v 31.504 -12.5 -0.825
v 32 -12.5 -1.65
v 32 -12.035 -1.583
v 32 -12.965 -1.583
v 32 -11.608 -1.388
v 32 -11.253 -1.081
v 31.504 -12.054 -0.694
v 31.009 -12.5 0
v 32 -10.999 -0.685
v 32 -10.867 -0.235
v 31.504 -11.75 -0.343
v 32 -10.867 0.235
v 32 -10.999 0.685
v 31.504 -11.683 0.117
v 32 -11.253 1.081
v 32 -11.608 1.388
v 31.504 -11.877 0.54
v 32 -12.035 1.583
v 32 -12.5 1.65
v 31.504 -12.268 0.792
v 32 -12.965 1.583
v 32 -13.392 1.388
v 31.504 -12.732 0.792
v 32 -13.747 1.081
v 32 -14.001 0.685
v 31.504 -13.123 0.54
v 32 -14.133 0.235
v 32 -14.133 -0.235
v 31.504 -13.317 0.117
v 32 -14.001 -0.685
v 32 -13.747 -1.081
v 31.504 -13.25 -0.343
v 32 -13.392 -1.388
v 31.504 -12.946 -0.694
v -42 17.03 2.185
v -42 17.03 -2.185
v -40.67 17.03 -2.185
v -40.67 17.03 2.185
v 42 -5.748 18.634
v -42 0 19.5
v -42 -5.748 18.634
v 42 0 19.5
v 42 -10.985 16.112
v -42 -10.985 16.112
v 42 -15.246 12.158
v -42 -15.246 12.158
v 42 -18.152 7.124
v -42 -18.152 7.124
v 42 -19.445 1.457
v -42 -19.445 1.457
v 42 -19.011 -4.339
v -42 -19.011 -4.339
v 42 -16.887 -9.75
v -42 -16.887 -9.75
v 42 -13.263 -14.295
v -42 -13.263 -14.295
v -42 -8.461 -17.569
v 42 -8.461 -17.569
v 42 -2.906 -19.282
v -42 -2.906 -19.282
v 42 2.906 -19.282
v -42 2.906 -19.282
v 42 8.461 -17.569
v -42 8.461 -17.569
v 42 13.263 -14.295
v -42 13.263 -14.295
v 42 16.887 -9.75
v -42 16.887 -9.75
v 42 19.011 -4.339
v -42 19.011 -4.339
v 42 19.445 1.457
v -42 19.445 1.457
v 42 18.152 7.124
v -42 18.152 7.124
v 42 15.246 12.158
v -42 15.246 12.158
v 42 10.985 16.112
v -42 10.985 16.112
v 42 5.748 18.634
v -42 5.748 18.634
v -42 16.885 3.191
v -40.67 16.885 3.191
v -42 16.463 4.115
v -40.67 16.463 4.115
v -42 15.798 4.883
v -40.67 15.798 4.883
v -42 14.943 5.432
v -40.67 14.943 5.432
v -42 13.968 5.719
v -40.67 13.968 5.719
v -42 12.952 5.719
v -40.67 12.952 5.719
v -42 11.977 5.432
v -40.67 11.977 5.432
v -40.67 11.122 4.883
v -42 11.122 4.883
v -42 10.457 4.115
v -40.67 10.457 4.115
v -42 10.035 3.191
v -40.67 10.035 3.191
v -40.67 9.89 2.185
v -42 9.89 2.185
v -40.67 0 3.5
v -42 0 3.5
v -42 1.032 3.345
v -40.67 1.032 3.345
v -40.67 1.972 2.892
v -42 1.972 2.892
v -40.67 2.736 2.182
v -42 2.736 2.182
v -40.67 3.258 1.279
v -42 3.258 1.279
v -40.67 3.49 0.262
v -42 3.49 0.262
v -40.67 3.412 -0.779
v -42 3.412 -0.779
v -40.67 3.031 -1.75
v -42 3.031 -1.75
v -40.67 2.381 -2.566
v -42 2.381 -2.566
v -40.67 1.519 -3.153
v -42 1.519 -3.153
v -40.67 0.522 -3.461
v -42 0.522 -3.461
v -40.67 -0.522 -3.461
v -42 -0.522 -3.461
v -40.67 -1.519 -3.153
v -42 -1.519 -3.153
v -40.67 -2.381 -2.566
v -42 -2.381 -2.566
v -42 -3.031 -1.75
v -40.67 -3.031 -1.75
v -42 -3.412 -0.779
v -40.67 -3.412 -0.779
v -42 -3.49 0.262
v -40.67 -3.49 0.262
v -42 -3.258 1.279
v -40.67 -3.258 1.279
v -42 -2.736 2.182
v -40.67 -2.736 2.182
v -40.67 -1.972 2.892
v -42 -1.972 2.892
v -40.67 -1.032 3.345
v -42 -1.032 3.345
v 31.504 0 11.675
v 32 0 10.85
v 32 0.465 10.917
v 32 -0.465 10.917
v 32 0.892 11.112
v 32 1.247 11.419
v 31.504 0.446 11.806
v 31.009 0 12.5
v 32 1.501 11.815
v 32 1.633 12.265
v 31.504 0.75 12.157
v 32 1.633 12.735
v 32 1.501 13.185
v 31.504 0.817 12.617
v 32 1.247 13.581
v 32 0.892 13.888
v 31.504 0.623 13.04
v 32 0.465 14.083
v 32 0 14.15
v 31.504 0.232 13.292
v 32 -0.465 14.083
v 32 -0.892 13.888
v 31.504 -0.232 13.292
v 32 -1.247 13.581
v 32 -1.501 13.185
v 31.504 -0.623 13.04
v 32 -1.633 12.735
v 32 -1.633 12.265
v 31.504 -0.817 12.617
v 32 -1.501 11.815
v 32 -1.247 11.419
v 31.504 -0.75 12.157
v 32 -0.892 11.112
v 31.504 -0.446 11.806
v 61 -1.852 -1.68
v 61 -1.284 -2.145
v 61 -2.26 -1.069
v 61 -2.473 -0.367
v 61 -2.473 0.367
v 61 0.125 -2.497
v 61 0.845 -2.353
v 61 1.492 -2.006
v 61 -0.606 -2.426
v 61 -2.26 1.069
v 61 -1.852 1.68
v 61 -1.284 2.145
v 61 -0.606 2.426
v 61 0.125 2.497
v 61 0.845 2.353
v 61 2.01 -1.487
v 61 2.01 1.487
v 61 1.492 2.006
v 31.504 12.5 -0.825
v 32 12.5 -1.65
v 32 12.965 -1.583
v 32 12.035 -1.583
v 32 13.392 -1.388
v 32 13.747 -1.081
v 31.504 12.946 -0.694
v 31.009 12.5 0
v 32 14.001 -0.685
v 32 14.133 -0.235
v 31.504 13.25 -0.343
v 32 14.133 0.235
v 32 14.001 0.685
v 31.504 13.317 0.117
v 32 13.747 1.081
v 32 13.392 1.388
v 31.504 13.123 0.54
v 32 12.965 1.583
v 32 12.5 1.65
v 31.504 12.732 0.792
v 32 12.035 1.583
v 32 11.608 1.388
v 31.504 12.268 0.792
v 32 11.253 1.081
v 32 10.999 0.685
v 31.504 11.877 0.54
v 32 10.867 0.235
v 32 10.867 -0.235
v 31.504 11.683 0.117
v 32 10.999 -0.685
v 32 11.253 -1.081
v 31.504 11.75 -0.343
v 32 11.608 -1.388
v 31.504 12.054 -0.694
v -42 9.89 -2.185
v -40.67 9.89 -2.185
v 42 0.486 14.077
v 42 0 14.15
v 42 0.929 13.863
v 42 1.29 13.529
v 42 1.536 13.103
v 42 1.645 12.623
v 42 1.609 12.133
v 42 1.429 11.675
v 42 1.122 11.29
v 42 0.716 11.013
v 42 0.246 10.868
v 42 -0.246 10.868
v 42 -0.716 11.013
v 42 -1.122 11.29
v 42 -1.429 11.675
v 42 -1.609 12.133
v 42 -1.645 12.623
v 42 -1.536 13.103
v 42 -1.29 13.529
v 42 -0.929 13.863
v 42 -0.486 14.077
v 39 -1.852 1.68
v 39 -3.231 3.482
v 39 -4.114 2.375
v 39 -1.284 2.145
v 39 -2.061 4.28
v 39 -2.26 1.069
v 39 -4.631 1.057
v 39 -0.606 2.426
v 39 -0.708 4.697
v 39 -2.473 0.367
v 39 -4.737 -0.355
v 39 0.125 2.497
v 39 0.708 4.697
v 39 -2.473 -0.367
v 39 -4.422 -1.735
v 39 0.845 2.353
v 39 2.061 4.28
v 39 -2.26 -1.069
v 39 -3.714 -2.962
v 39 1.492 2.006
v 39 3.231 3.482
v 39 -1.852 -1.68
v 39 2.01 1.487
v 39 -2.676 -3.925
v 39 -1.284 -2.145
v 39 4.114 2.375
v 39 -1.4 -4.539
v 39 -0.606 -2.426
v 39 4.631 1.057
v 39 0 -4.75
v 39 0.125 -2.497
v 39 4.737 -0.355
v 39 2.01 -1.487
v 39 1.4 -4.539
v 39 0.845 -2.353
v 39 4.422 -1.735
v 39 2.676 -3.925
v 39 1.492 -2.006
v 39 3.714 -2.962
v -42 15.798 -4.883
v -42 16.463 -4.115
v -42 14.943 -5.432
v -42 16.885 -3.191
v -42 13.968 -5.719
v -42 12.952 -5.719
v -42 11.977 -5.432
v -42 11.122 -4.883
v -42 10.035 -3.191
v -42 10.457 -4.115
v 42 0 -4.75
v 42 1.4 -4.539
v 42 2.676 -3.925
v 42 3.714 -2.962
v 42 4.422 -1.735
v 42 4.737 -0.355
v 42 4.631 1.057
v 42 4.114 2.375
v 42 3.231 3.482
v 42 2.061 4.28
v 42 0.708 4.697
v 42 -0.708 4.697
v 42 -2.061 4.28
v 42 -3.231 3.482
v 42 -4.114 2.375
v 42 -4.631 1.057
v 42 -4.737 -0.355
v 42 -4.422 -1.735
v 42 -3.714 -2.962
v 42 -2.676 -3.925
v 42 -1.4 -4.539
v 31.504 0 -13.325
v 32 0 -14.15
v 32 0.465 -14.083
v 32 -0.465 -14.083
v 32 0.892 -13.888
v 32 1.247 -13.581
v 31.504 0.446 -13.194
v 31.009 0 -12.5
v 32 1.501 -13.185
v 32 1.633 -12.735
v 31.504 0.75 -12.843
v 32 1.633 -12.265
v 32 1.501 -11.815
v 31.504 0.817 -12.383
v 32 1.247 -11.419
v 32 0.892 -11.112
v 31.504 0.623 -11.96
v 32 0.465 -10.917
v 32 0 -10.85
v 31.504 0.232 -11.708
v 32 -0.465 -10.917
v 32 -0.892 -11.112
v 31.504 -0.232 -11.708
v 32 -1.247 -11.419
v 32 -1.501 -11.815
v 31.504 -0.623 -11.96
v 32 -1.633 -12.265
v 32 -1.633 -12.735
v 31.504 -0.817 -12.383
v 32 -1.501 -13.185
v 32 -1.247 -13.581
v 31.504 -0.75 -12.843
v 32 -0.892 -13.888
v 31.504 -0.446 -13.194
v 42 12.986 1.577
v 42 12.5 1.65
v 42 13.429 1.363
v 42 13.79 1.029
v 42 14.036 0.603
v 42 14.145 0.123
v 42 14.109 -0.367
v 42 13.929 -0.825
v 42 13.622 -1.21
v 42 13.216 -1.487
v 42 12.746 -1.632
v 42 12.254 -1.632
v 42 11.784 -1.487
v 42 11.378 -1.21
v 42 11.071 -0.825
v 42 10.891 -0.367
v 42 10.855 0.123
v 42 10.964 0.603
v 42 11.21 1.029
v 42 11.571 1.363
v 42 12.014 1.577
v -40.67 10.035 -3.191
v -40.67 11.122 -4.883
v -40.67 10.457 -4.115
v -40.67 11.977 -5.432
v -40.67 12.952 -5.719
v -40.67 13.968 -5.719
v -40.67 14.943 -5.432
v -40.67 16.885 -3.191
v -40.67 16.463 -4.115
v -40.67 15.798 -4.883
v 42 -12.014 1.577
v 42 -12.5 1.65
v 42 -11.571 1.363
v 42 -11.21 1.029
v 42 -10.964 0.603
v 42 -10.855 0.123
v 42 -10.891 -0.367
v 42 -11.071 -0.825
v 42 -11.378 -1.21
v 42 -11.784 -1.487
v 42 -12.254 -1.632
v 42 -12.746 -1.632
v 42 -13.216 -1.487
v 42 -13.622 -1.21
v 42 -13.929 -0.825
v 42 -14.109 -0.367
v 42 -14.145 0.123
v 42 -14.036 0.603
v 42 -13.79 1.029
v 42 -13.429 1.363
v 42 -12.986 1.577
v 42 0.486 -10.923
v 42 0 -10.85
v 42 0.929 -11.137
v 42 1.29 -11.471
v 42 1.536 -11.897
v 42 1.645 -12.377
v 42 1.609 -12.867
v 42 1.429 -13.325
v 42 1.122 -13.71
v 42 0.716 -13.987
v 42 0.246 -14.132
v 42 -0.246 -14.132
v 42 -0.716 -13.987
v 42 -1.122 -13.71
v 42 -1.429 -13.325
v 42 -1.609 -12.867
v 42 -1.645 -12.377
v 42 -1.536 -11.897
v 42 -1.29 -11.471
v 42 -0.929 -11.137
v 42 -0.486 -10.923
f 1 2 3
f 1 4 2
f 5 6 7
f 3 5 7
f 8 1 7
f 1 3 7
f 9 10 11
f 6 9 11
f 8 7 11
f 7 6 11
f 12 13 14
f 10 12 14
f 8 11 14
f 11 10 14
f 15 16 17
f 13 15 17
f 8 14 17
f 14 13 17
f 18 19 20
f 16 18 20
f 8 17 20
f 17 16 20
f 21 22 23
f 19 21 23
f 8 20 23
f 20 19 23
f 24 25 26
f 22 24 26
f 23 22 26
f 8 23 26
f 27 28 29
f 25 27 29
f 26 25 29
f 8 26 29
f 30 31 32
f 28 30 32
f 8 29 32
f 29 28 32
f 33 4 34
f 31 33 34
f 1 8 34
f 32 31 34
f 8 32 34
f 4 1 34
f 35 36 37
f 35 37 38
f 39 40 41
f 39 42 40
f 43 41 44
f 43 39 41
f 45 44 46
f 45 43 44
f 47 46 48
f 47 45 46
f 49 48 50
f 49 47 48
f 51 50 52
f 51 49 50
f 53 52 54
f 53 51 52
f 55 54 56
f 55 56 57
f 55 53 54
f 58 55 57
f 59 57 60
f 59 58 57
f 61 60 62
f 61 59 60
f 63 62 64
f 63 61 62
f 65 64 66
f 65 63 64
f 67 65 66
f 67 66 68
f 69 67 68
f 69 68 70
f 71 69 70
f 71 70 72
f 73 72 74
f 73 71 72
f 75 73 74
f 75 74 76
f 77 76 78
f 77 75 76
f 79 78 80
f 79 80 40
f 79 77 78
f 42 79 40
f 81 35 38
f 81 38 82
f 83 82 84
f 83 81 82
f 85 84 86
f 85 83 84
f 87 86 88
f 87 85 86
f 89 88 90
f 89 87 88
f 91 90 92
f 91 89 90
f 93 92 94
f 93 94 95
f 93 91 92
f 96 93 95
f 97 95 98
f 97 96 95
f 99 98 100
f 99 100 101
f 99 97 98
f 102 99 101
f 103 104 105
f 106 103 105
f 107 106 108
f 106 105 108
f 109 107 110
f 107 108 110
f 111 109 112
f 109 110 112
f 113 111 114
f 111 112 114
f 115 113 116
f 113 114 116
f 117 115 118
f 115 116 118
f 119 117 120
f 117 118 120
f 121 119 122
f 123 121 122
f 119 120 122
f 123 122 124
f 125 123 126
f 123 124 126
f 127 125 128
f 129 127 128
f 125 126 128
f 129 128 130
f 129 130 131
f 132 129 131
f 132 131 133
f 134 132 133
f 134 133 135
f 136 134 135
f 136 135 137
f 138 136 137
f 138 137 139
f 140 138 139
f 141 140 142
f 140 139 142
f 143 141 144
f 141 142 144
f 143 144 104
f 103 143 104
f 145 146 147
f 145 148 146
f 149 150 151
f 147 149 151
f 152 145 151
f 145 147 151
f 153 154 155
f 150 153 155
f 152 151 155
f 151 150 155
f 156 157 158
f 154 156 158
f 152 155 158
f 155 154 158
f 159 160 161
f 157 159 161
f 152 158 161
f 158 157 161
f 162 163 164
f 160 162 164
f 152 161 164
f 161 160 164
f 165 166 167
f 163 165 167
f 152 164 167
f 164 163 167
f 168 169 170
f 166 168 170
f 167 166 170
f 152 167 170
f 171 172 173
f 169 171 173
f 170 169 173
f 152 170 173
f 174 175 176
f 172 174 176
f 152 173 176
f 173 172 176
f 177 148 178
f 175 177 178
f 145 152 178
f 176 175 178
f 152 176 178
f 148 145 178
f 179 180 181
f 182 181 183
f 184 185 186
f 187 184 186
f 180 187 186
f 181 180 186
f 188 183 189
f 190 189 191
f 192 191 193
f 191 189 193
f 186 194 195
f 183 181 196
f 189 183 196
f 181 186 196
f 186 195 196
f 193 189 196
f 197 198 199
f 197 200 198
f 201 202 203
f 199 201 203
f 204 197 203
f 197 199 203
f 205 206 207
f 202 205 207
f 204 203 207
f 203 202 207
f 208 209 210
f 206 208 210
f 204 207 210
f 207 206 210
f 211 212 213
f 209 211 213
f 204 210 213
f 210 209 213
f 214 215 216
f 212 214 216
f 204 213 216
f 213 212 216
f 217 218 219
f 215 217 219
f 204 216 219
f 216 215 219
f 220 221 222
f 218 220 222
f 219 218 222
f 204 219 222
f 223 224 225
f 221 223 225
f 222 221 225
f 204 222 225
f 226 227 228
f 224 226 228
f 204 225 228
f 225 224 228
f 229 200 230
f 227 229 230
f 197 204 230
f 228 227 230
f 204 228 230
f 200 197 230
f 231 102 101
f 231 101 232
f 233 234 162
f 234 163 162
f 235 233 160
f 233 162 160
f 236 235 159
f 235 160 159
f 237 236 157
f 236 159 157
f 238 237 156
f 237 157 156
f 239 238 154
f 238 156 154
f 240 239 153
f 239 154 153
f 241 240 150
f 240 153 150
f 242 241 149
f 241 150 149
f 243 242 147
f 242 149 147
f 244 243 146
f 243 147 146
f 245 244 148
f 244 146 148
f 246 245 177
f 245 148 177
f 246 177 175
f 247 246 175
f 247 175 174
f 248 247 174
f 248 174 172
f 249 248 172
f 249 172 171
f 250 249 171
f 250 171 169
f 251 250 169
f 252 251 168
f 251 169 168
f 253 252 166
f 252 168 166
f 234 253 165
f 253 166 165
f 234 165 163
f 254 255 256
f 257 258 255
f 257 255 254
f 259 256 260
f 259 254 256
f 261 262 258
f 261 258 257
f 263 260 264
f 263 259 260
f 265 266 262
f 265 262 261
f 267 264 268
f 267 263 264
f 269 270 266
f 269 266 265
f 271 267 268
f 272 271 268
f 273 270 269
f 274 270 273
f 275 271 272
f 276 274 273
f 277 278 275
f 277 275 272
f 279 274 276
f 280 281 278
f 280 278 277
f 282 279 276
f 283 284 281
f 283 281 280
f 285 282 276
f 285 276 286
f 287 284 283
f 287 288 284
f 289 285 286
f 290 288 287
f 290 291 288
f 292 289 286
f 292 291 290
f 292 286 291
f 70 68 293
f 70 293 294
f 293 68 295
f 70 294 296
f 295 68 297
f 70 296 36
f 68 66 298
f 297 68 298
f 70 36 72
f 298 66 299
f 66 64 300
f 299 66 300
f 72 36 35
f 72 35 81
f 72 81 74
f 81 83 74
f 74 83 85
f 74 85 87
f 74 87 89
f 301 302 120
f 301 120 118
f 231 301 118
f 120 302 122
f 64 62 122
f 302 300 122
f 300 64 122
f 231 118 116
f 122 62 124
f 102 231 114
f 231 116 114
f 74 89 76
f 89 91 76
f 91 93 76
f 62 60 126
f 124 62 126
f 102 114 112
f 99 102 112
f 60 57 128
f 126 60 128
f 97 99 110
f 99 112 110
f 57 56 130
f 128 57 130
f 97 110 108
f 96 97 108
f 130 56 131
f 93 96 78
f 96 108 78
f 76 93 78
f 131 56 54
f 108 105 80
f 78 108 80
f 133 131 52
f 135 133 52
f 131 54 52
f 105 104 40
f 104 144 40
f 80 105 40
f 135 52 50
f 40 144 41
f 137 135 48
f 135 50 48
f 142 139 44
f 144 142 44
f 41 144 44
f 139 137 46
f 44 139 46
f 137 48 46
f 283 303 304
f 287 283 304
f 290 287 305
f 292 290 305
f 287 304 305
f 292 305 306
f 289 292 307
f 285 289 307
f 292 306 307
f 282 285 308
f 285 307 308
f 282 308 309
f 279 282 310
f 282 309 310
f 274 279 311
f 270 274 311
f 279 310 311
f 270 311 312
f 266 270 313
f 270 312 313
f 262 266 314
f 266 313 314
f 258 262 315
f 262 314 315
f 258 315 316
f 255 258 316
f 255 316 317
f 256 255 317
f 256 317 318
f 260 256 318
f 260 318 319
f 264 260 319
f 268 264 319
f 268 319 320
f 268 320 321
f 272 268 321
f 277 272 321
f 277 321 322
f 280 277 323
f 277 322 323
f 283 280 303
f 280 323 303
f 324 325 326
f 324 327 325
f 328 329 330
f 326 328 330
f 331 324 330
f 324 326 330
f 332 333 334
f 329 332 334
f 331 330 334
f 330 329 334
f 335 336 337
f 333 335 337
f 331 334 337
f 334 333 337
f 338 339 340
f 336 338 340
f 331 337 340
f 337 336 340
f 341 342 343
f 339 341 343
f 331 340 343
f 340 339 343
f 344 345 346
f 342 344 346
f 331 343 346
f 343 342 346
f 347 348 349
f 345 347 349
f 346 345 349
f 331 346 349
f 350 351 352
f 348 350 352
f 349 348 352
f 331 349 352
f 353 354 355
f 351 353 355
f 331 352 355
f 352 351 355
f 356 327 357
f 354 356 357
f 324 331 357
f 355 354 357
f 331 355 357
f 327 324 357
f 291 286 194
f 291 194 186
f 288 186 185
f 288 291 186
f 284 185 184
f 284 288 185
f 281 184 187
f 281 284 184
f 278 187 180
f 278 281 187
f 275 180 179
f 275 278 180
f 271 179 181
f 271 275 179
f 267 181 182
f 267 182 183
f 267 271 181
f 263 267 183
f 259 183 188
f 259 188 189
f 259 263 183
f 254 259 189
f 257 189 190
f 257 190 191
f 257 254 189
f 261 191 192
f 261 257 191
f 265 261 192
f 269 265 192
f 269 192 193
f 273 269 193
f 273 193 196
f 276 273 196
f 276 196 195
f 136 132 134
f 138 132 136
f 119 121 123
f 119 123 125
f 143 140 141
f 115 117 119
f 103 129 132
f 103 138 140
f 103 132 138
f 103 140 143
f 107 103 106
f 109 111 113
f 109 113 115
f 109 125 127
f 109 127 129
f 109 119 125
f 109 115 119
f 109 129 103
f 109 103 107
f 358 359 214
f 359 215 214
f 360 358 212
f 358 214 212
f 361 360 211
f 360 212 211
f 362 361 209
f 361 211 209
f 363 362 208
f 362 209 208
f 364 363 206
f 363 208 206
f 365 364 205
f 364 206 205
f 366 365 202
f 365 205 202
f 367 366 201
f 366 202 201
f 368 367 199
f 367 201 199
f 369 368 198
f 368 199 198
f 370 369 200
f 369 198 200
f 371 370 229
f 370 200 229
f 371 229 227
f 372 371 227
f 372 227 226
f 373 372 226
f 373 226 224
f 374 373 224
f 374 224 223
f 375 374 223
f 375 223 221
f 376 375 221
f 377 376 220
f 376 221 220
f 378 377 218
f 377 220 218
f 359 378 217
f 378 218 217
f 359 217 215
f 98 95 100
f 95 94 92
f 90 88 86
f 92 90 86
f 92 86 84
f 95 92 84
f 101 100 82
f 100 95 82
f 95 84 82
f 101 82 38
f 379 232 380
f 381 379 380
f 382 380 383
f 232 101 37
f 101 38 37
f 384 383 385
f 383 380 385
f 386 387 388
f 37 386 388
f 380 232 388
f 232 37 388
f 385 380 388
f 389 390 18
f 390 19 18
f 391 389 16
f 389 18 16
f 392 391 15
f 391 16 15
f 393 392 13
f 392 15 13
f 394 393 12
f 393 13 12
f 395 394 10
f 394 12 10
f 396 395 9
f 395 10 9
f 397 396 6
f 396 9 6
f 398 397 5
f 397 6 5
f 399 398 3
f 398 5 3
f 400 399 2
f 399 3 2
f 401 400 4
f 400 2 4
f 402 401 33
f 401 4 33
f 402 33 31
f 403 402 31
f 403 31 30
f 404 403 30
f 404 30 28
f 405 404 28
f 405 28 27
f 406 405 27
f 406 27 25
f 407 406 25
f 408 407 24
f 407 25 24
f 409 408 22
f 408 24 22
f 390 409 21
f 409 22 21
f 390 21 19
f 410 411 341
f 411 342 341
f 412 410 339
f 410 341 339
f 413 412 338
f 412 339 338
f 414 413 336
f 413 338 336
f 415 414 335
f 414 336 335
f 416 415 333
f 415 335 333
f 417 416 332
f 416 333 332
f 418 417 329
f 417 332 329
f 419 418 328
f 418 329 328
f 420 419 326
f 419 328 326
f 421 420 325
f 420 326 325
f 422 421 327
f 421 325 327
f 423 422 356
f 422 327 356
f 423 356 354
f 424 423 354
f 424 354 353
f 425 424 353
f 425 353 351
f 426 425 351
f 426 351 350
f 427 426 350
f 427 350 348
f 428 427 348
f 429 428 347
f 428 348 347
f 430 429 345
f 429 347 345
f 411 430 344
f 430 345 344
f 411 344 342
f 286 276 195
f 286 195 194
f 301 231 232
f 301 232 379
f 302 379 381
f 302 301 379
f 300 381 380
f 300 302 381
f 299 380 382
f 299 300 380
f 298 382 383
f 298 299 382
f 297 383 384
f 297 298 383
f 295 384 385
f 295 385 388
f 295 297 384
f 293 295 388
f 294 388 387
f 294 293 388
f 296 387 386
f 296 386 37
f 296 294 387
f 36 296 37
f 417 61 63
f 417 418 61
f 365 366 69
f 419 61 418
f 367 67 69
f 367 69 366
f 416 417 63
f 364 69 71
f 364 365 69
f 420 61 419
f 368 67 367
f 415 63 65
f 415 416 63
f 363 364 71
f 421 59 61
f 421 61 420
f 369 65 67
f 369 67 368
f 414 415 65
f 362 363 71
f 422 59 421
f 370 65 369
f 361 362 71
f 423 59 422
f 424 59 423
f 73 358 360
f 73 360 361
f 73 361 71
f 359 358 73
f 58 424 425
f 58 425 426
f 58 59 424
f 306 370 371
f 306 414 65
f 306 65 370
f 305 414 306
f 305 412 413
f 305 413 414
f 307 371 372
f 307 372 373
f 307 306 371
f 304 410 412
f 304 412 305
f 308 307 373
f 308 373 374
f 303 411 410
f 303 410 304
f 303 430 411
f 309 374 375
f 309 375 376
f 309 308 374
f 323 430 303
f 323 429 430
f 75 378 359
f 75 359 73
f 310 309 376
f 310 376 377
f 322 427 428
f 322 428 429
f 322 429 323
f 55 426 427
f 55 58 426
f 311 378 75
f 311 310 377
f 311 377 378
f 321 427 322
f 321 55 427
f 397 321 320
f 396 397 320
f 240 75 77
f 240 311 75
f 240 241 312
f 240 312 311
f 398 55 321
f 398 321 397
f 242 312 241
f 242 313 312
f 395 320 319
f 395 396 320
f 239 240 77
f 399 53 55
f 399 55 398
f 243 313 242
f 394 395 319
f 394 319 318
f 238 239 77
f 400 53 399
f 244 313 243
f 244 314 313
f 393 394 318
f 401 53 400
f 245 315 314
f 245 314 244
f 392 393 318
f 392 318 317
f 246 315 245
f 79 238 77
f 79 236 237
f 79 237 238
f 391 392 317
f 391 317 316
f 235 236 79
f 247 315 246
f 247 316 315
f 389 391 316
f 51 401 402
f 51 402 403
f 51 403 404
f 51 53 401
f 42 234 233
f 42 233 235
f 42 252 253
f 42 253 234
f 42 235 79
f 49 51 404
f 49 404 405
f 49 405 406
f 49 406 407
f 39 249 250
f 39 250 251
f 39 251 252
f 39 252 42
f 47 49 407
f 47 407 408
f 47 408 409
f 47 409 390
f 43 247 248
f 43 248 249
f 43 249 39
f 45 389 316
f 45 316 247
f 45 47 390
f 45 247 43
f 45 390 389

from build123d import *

# Parameters (mm, degrees)
SKETCH1_R                       = 19.5
BOSS_EXTRUDE1_DEPTH             = 42
SKETCH2_R                       = 4.75
CUT_EXTRUDE1_DEPTH              = 3
BOSS_EXTRUDE2_DEPTH             = 22
TAP_DRILL_FOR_M4X0_7_TAP1_D     = 3.3
TAP_DRILL_FOR_M4X0_7_TAP1_DEPTH = 10.0000054
TAP_DRILL_FOR_M4X0_7_TAP1_TIP   = 0.991420021
SKETCH6_R                       = 3.5
CUT_EXTRUDE2_DEPTH              = 1.33


with BuildPart() as part:
    # Sketch1 → Boss-Extrude1 (new, symmetric)
    with BuildSketch(Plane(origin=(0, 0, 0), x_dir=(0, 0, -1), z_dir=(1, 0, 0))):
        with Locations(Location((0, 0, 0), (0, 0, 180))):
            Circle(SKETCH1_R)
    extrude(amount=BOSS_EXTRUDE1_DEPTH, both=True)

    # Sketch2 → Cut-Extrude1 (cut)
    with BuildSketch(Plane(origin=(42, 0, 0), x_dir=(0, 0, -1), z_dir=(1, 0, 0))):
        Circle(SKETCH2_R)
    extrude(amount=-CUT_EXTRUDE1_DEPTH, mode=Mode.SUBTRACT)

    # Sketch3 → Boss-Extrude2 (add)
    with BuildSketch(Plane(origin=(39, 0, 0), x_dir=(0, 0, -1), z_dir=(1, 0, 0))):
        with BuildLine():
            Line((-1.486573241, 2.01), (1.486573241, 2.01))
            ThreePointArc((1.486573241, 2.01), (0, -2.5), (-1.486573241, 2.01))
        make_face()
    extrude(amount=BOSS_EXTRUDE2_DEPTH)

    # Tap Drill for M4x0.7 Tap1
    with Locations(Plane(origin=(42, 0, 0), x_dir=(0, 0, -1), z_dir=(1, 0, 0))):
        with Locations((0, 12.5), (12.5, 0), (0, -12.5), (-12.5, 0)):
            Hole(TAP_DRILL_FOR_M4X0_7_TAP1_D / 2, depth=TAP_DRILL_FOR_M4X0_7_TAP1_DEPTH)
            with Locations((0, 0, -(TAP_DRILL_FOR_M4X0_7_TAP1_DEPTH + TAP_DRILL_FOR_M4X0_7_TAP1_TIP / 2))):  # 118° drill point
                Cone(0, TAP_DRILL_FOR_M4X0_7_TAP1_D / 2, TAP_DRILL_FOR_M4X0_7_TAP1_TIP, mode=Mode.SUBTRACT)

    # Sketch6 → Cut-Extrude2 (cut)
    with BuildSketch(Plane.ZY.offset(42)):
        Circle(SKETCH6_R)
        with BuildLine():
            Line((-2.185, 17.03), (2.185, 17.03))
            ThreePointArc((2.185, 17.03), (5.755, 13.46), (2.185, 9.89))
            Line((2.185, 9.89), (-2.185, 9.89))
            ThreePointArc((-2.185, 9.89), (-5.755, 13.46), (-2.185, 17.03))
        make_face()
    extrude(amount=-CUT_EXTRUDE2_DEPTH, mode=Mode.SUBTRACT)


solid = part.part
